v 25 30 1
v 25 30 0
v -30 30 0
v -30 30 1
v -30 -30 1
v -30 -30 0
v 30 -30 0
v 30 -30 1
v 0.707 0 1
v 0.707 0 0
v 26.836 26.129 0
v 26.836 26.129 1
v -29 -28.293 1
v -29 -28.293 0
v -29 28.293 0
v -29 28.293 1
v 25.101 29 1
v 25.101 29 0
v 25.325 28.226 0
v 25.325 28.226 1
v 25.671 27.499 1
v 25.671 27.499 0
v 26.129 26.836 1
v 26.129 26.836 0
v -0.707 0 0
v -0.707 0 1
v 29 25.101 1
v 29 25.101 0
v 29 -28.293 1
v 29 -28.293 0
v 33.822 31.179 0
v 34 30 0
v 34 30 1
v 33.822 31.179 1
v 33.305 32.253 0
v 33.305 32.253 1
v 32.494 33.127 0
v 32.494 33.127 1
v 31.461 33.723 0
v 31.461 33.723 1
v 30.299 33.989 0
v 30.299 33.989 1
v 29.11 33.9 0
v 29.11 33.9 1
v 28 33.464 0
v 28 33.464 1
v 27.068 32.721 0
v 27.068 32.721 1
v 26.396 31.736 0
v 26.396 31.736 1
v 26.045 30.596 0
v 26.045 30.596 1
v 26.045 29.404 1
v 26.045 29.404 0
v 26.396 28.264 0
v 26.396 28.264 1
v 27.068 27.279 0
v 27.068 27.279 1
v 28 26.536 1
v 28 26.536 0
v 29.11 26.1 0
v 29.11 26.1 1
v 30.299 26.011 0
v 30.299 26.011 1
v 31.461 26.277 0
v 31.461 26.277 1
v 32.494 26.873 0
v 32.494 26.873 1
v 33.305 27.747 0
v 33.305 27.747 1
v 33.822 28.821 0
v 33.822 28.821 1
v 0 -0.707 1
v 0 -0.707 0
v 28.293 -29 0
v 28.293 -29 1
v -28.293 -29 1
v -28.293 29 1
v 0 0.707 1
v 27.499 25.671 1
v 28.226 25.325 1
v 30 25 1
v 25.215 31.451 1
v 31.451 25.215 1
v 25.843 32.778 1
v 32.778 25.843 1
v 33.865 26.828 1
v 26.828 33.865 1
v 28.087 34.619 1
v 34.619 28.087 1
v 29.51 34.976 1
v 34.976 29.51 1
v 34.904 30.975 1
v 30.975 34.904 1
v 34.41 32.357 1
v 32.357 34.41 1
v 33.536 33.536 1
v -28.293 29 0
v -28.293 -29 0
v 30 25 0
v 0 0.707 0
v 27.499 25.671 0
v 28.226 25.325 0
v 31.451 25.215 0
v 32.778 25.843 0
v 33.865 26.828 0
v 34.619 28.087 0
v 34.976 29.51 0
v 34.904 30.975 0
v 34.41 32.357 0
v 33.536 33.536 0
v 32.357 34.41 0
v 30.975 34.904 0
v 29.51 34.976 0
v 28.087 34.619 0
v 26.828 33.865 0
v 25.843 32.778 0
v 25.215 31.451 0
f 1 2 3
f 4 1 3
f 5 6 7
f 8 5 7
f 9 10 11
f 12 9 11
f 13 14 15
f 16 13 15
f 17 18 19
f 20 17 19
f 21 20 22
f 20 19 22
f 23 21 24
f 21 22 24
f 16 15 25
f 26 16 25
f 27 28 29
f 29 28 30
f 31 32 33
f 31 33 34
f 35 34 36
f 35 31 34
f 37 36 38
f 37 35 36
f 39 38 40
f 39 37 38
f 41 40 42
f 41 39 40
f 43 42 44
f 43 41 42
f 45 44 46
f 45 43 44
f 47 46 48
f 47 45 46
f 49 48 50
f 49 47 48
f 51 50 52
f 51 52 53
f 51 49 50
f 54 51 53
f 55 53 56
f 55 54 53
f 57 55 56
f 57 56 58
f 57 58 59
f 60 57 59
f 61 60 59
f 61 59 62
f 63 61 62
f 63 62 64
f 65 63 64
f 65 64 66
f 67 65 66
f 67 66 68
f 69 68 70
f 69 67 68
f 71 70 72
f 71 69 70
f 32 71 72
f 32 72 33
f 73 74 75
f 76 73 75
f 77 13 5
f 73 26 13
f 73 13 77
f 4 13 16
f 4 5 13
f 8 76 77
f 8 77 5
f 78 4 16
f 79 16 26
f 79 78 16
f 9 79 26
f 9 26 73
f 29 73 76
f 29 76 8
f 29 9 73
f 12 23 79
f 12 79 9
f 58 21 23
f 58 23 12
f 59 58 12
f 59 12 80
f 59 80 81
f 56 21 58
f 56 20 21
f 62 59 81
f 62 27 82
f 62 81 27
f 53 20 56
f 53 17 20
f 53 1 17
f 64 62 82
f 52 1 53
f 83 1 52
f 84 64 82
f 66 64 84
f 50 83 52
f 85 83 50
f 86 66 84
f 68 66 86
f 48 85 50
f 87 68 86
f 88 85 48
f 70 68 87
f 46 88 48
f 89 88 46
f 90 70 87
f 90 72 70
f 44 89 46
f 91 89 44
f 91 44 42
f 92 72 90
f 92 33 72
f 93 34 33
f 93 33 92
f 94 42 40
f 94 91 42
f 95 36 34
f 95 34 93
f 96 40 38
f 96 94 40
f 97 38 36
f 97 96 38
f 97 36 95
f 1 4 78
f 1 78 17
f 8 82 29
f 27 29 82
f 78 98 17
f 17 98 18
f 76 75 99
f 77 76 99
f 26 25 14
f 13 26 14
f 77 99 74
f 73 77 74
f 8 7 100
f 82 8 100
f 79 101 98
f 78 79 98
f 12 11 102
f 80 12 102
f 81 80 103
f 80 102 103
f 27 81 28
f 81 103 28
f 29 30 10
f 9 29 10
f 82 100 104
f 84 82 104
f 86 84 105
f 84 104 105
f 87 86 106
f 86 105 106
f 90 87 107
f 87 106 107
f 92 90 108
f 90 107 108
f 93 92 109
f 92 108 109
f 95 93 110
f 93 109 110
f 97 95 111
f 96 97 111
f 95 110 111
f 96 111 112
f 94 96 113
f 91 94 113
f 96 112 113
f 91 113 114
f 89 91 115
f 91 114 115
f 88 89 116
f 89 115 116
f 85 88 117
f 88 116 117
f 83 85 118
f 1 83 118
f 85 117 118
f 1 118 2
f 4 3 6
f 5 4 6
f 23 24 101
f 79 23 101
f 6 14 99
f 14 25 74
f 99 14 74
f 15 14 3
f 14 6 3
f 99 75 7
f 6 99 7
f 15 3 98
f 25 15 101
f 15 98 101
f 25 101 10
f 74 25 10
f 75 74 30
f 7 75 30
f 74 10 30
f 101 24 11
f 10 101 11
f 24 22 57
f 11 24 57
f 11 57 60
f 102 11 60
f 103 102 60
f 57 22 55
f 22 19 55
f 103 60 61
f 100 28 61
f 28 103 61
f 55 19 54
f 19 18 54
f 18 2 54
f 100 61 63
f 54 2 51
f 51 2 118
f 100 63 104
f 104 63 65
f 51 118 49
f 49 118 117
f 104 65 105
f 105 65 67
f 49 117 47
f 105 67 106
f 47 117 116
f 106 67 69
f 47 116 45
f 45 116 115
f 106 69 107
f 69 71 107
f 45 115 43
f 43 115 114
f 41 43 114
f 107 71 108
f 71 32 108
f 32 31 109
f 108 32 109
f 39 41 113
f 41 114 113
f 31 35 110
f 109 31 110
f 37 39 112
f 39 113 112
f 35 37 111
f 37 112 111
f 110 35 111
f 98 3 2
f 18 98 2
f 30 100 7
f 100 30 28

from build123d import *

# Parameters (mm, degrees)
F0_R     = 3.999999
F1_DEPTH = 1


with BuildPart() as f1:
    # F0 (on Top) → F1 (new body)
    with BuildSketch(Plane.XY):
        with BuildLine():
            Line((25, 30), (-30, 30))
            Line((-30, 30), (-30, -30))
            Line((-30, -30), (30, -30))
            Line((30, -30), (30, 25))
            ThreePointArc((30, 25), (33.535534, 33.535534), (25, 30))
        make_face()
        Polygon((28.292893, -29), (-28.292893, -29), (0, -0.707107), align=None, mode=Mode.SUBTRACT)
        Polygon((-29, -28.292893), (-29, 28.292893), (-0.707107, 0), align=None, mode=Mode.SUBTRACT)
        with BuildLine():
            Line((0.707107, 0), (26.835742, 26.128635))
            ThreePointArc((26.835742, 26.128635), (27.855411, 25.483282), (29, 25.101021))
            Line((29, 25.101021), (29, -28.292893))
            Line((29, -28.292893), (0.707107, 0))
        make_face(mode=Mode.SUBTRACT)
        with BuildLine():
            Line((0, 0.707107), (-28.292893, 29))
            Line((-28.292893, 29), (25.101021, 29))
            ThreePointArc((25.101021, 29), (25.483282, 27.855411), (26.128635, 26.835742))
            Line((26.128635, 26.835742), (0, 0.707107))
        make_face(mode=Mode.SUBTRACT)
        with Locations((30, 30)):
            Circle(F0_R, mode=Mode.SUBTRACT)
    extrude(amount=F1_DEPTH)


solid = f1.part
